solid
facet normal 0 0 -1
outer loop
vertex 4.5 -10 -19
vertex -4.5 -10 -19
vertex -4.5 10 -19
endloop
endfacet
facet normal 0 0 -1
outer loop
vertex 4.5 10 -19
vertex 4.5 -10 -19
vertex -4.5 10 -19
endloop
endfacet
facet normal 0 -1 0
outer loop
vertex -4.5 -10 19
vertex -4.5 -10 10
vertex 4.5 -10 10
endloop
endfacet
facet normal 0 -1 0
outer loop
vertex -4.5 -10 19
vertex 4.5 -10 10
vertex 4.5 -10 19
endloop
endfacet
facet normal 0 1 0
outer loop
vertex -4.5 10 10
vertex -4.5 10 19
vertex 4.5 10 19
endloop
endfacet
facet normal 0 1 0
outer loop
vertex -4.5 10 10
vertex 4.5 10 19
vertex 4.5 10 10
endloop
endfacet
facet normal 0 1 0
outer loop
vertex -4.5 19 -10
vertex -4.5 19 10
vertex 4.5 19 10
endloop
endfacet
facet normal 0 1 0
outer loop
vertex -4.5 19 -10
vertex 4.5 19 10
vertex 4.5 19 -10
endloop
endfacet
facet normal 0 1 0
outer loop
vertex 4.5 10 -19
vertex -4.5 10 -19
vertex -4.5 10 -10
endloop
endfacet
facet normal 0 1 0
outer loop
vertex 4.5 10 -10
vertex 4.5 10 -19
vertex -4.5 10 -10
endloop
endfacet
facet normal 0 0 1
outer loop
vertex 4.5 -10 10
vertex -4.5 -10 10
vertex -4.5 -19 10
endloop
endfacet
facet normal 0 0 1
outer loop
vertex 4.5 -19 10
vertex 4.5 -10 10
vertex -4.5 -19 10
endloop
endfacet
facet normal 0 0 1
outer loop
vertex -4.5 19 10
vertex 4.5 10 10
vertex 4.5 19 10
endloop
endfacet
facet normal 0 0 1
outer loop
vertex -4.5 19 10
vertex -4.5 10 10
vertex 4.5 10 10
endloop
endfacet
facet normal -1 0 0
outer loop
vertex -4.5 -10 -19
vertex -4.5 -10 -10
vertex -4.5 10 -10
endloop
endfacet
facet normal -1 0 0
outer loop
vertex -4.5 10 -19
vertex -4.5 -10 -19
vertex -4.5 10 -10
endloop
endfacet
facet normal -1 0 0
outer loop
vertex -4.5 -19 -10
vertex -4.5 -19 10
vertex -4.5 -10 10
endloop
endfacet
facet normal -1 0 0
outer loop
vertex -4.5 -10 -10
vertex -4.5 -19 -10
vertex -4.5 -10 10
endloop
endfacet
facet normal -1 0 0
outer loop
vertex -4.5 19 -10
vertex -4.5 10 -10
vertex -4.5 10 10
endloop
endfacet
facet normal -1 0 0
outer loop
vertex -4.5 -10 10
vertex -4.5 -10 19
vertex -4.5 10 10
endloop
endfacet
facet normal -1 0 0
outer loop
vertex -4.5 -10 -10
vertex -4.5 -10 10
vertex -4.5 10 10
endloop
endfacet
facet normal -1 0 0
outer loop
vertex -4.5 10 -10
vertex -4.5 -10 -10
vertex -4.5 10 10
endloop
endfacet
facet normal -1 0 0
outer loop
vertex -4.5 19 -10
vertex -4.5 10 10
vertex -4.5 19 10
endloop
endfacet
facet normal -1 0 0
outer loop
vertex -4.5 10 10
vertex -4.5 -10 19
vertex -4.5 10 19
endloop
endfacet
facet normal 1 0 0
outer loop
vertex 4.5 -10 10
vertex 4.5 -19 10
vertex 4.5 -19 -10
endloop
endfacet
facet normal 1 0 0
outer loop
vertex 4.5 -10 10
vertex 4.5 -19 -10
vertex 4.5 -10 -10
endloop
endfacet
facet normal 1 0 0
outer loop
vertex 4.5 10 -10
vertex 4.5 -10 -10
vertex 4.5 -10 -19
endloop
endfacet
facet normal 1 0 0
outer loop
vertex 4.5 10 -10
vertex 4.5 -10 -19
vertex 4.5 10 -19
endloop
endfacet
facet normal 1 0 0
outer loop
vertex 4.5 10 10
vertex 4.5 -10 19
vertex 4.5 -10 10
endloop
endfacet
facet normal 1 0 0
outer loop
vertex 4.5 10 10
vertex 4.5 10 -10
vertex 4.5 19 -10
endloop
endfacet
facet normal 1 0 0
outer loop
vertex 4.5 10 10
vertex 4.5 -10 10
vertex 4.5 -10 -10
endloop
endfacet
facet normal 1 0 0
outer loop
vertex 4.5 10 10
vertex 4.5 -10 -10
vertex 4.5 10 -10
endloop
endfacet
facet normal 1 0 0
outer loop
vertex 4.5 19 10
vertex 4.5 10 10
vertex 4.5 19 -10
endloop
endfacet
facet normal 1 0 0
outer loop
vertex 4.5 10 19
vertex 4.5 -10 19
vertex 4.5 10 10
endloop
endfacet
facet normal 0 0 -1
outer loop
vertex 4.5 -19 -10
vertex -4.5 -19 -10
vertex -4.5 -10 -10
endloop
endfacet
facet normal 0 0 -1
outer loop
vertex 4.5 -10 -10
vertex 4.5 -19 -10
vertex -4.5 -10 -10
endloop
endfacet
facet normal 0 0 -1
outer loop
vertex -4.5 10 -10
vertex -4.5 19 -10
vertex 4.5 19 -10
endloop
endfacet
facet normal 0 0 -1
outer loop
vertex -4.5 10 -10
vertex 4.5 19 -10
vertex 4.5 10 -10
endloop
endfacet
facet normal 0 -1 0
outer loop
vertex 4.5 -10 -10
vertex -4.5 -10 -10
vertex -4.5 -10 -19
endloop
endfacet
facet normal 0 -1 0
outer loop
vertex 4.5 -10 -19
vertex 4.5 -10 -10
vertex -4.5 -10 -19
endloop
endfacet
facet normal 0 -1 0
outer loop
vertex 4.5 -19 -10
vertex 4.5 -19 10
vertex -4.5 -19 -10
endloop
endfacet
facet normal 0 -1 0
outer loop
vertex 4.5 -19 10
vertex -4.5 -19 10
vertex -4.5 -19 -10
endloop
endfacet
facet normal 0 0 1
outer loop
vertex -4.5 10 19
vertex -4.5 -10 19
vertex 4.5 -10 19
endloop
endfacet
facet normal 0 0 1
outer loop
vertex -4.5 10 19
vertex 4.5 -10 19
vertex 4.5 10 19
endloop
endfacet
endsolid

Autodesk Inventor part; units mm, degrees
ref_plane "YZ Plane" through (0, 0, 0) normal (1, 0, 0) x (0, 1, 0)
ref_plane "XZ Plane" through (0, 0, 0) normal (0, 1, 0) x (-1, 0, 0)
ref_plane "XY Plane" through (0, 0, 0) normal (0, 0, 1) x (1, 0, 0)
sketch "Inner Rib Profile" plane through (0, 0, 0) normal (1, 0, 0) x (0, 1, 0)
  line L0 (-10, 10) -> (10, 10) construction
  line L1 (10, 10) -> (10, -10) construction
  line L2 (10, -10) -> (-10, -10) construction
  line L3 (-10, -10) -> (-10, 10) construction
  line L4 (-10, 10) -> (10, -10) construction
  line L5 (10, 10) -> (-10, -10) construction
  line L6 (-10, -10) -> (-10, -19)
  line L7 (-10, -19) -> (10, -19)
  line L8 (10, -19) -> (10, -10)
  line L9 (0, 0) -> (-10, 0) construction
  line L10 (-10, 10) -> (-10, 19)
  line L11 (-10, 19) -> (10, 19)
  line L12 (10, 19) -> (10, 10)
  line L13 (-10, 10) -> (-19, 10)
  line L14 (-19, 10) -> (-19, -10)
  line L15 (-19, -10) -> (-10, -10)
  line L16 (0, 0) -> (0, 10) construction
  line L17 (10, 10) -> (19, 10)
  line L18 (19, 10) -> (19, -10)
  line L19 (19, -10) -> (10, -10)
  dimension "d0" = 20
  dimension "d1" = 20
  dimension "d2" = 9
  dimension "d3" = 9
extrude "Make Inner Rib by Extrusion of Its Profile" add sketch "Inner Rib Profile" along normal mid plane 9
sketch "Laser Cutter Sketch" plane through (4.5, 0, 0) normal (1, 0, 0) x (0, 0, -1)
  line L0 (-19, 10) -> (-19, -10) construction
  line L1 (-19, -10) -> (-10, -10) construction
  line L2 (-10, -10) -> (-10, -19) projected
  line L3 (-10, -19) -> (10, -19) projected
  line L4 (10, -19) -> (10, -10) projected
  line L5 (10, -10) -> (19, -10) construction
  line L6 (19, -10) -> (19, 10) construction
  line L7 (19, 10) -> (10, 10) construction
  line L8 (10, 10) -> (10, 19) projected
  line L9 (10, 19) -> (-10, 19) projected
  line L10 (-10, 19) -> (-10, 10) projected
  line L11 (-10, 10) -> (-19, 10) construction
  line L12 (0, 0) -> (0, 19) construction
  line L13 (-5, 0) -> (5, 0) construction
  line L14 (-5, -2.5) -> (5, -2.5)
  line L15 (5, 2.5) -> (-5, 2.5)
  arc A0 (-5, 2.5) -> (-5, -2.5) centre (-5, 0) ccw
  arc A1 (5, -2.5) -> (5, 2.5) centre (5, 0) ccw
  line L16 (10, -10.25) -> (19.25, -10.25)
  line L17 (19.25, -10.25) -> (19.25, 10.25)
  line L18 (19.25, 10.25) -> (10, 10.25)
  line L19 (-10, -10.25) -> (-19.25, -10.25)
  line L20 (-19.25, -10.25) -> (-19.25, 10.25)
  line L21 (-19.25, 10.25) -> (-10, 10.25)
  line L22 (-10, -19) -> (-10, -10.25)
  line L23 (-10, 19) -> (-10, 10.25)
  line L24 (10, -10.25) -> (10, -19)
  line L25 (10, 10.25) -> (10, 19)
  dimension "d7" = 10
  dimension "d8" = 5
  dimension "d13" = 0.25
equation "\"d0\" = InnerRibHeight"
equation "\"d1\" = RibSlotLength"
equation "\"d2\" = PrototypePlateMaterialThickness"
equation "\"d4\" = PrototypePlateRibMaterialThickness"
equation "\"InnerRibHeight\" = 20"
equation "\"RibSlotLength\" = 20"
equation "\"PrototypePlateMaterialThickness\" = 9"
equation "\"PrototypePlateRibMaterialThickness\" = 9"
properties part number "Inner Rib"
